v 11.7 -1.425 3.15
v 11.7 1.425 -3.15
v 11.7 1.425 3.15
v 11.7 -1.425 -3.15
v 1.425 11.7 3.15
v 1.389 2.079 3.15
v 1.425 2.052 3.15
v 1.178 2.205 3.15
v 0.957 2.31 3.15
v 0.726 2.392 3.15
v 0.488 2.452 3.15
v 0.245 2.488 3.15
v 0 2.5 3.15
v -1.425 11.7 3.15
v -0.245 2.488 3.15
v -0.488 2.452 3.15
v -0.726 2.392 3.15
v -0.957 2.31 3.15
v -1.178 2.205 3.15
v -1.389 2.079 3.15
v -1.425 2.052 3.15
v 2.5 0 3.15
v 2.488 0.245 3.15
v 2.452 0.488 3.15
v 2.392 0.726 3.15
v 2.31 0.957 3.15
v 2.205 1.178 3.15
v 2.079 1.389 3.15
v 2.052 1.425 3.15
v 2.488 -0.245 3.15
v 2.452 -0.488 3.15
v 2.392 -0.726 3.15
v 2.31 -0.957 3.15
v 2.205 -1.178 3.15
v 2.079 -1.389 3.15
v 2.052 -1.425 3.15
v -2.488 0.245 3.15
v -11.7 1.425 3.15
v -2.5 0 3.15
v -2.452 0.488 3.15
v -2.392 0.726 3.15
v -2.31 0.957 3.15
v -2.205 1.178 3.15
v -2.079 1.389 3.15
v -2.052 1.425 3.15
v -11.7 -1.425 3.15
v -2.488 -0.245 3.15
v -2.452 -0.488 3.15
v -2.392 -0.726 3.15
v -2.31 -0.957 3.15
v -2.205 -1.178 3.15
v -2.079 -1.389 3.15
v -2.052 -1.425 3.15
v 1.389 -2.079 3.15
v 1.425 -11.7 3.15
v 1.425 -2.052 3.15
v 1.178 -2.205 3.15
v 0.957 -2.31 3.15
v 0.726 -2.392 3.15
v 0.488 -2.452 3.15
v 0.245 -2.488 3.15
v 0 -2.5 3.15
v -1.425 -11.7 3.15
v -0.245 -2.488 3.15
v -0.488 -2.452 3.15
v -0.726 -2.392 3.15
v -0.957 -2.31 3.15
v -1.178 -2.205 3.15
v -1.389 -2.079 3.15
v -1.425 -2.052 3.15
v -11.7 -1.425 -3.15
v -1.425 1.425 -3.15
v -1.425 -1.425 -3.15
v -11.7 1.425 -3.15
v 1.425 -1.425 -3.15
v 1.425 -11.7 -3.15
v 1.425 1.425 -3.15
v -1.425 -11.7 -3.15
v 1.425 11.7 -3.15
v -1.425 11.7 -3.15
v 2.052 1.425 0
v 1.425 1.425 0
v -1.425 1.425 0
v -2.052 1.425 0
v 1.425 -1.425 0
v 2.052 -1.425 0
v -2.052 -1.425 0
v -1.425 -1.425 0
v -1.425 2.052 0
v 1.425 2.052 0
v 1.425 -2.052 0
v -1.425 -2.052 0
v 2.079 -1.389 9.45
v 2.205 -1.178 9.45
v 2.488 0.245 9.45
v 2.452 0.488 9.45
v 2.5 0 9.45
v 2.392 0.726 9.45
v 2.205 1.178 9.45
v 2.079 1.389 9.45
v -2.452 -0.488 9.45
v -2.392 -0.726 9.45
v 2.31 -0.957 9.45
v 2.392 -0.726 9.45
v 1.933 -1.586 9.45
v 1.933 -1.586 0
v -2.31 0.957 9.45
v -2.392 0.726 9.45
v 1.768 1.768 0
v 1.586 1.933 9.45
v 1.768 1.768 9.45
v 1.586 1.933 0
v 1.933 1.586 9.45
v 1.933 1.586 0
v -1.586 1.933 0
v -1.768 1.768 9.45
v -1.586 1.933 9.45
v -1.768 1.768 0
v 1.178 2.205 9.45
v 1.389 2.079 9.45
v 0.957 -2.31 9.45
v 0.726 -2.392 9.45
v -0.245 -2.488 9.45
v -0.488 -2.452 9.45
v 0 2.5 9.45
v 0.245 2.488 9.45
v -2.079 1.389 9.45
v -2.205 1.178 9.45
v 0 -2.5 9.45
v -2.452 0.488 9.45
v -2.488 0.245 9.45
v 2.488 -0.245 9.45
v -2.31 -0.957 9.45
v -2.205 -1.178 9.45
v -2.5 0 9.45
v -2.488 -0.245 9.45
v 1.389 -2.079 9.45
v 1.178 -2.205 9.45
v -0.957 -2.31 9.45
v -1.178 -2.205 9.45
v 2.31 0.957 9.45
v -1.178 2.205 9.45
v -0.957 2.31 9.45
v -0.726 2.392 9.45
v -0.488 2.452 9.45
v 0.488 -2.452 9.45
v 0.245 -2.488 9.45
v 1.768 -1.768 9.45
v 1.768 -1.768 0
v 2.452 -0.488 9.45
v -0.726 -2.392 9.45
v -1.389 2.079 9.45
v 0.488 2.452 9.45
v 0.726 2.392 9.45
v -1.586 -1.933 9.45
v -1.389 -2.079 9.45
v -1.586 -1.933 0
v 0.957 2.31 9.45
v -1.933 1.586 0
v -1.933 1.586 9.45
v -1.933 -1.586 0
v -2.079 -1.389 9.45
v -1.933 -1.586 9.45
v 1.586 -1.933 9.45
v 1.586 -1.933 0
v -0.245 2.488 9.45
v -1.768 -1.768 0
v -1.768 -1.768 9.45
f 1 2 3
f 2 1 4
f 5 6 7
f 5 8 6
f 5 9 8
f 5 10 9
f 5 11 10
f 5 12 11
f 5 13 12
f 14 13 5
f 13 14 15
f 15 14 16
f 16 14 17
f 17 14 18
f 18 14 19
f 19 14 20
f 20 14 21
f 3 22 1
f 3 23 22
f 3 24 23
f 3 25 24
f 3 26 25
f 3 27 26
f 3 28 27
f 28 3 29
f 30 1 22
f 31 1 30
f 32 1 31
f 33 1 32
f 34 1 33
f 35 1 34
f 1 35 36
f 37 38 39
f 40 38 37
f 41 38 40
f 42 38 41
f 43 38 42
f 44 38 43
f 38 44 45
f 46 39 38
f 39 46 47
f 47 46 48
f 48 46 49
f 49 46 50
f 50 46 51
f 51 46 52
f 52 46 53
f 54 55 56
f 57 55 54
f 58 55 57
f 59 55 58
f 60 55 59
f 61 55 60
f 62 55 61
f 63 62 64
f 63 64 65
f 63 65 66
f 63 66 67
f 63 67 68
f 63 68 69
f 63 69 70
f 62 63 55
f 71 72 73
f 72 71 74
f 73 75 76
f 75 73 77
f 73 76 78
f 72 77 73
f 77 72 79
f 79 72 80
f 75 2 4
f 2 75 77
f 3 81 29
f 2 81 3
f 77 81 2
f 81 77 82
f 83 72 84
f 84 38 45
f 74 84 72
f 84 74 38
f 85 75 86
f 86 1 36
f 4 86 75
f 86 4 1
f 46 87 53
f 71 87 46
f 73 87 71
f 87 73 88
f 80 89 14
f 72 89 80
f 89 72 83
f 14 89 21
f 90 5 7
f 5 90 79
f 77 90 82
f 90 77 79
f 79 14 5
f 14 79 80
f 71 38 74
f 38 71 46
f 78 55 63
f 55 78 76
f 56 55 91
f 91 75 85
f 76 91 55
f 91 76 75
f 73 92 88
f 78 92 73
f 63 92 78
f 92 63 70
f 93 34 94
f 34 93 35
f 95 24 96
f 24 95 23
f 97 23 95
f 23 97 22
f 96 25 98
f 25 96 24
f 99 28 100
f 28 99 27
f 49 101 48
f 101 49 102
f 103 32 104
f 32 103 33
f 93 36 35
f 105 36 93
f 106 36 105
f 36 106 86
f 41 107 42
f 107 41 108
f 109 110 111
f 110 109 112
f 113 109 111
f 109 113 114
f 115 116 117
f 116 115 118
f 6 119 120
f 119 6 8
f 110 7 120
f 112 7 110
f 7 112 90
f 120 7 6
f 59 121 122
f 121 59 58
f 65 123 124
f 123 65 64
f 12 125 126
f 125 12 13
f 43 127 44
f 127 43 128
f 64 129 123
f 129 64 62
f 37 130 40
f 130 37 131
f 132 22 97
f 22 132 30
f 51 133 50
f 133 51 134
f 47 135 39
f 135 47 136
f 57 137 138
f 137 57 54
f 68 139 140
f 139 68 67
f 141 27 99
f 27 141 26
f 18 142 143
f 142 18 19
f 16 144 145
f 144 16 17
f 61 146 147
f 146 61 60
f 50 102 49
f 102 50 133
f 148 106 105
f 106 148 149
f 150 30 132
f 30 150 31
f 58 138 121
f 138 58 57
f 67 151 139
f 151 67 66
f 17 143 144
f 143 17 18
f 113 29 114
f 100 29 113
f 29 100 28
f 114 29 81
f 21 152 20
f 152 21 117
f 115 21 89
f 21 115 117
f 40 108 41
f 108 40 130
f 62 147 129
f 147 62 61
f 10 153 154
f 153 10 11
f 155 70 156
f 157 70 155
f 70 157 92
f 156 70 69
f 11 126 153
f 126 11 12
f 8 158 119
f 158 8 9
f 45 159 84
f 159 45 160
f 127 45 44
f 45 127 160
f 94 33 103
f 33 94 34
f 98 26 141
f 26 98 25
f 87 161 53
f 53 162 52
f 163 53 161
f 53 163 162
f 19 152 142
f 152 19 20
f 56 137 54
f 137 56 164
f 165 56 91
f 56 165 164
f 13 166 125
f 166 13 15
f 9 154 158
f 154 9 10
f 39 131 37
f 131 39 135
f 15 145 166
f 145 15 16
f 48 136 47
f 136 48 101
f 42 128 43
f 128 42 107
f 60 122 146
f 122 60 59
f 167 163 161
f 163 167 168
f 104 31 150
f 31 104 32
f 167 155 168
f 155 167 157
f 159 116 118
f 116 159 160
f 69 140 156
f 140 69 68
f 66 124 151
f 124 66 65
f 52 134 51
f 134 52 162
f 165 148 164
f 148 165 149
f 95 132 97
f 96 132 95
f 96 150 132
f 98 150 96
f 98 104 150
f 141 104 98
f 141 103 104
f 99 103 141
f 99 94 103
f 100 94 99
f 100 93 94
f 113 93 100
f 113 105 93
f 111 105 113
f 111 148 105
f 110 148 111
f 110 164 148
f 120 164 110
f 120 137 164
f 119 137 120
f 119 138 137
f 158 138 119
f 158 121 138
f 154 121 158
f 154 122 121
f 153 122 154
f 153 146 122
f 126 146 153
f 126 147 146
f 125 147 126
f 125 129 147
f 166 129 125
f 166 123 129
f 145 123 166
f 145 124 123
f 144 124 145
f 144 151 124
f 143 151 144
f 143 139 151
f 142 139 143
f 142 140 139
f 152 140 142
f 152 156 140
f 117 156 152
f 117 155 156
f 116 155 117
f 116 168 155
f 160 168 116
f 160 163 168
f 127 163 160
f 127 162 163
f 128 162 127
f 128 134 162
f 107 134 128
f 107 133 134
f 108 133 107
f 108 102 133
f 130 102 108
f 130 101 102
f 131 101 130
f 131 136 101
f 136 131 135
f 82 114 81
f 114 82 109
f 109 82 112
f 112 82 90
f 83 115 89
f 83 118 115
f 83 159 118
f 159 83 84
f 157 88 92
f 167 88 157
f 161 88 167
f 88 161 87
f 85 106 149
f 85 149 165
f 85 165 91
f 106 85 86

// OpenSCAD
module cross_hub() {
    // Central cylinder
    cylinder(h=6.3, d=5, $fn=64);

    // Tab dimensions
    tab_length = 11.7;
    tab_width = 2.85;
    tab_height = 6.3;

    // Create a single tab
    module tab() {
        cube([tab_length, tab_width, tab_height], center=true);
    }

    // Position and union the tabs around the cylinder
    union() {
        translate([0, 0, 3.15]) cylinder(h=6.3, d=5, $fn=64);
        translate([0, 0, 0])
            for (angle = [0, 90, 180, 270])
                rotate([0, 0, angle])
                    translate([tab_length/2, 0, 0])
                        tab();
    }
}

cross_hub();
